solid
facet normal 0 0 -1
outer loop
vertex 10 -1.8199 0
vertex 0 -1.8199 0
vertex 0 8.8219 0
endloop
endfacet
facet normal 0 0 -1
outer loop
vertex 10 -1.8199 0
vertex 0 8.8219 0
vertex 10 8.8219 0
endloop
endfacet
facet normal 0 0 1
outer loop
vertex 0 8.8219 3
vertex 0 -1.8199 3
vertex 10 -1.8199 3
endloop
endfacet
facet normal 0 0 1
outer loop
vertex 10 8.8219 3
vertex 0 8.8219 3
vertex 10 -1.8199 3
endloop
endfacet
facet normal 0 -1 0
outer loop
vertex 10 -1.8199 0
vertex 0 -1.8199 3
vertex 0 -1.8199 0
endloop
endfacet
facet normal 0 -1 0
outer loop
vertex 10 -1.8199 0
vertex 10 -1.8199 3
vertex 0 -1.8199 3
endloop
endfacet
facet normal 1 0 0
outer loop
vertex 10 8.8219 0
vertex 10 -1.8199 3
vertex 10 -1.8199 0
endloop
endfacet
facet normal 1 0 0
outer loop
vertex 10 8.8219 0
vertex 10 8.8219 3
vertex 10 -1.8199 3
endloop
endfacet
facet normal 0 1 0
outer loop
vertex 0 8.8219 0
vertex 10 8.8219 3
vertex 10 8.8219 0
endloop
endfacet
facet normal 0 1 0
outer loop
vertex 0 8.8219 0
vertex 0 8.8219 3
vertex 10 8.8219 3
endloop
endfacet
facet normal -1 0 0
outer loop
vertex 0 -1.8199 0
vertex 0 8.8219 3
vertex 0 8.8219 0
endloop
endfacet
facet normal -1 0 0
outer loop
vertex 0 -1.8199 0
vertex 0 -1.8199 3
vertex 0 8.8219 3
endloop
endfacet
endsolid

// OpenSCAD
// projection(cut=true): the z=0 cross-section of a tilted cube, re-extruded.
linear_extrude(3) projection(cut = true) translate([0, 0, -5]) rotate([20, 0, 0]) cube(10);
